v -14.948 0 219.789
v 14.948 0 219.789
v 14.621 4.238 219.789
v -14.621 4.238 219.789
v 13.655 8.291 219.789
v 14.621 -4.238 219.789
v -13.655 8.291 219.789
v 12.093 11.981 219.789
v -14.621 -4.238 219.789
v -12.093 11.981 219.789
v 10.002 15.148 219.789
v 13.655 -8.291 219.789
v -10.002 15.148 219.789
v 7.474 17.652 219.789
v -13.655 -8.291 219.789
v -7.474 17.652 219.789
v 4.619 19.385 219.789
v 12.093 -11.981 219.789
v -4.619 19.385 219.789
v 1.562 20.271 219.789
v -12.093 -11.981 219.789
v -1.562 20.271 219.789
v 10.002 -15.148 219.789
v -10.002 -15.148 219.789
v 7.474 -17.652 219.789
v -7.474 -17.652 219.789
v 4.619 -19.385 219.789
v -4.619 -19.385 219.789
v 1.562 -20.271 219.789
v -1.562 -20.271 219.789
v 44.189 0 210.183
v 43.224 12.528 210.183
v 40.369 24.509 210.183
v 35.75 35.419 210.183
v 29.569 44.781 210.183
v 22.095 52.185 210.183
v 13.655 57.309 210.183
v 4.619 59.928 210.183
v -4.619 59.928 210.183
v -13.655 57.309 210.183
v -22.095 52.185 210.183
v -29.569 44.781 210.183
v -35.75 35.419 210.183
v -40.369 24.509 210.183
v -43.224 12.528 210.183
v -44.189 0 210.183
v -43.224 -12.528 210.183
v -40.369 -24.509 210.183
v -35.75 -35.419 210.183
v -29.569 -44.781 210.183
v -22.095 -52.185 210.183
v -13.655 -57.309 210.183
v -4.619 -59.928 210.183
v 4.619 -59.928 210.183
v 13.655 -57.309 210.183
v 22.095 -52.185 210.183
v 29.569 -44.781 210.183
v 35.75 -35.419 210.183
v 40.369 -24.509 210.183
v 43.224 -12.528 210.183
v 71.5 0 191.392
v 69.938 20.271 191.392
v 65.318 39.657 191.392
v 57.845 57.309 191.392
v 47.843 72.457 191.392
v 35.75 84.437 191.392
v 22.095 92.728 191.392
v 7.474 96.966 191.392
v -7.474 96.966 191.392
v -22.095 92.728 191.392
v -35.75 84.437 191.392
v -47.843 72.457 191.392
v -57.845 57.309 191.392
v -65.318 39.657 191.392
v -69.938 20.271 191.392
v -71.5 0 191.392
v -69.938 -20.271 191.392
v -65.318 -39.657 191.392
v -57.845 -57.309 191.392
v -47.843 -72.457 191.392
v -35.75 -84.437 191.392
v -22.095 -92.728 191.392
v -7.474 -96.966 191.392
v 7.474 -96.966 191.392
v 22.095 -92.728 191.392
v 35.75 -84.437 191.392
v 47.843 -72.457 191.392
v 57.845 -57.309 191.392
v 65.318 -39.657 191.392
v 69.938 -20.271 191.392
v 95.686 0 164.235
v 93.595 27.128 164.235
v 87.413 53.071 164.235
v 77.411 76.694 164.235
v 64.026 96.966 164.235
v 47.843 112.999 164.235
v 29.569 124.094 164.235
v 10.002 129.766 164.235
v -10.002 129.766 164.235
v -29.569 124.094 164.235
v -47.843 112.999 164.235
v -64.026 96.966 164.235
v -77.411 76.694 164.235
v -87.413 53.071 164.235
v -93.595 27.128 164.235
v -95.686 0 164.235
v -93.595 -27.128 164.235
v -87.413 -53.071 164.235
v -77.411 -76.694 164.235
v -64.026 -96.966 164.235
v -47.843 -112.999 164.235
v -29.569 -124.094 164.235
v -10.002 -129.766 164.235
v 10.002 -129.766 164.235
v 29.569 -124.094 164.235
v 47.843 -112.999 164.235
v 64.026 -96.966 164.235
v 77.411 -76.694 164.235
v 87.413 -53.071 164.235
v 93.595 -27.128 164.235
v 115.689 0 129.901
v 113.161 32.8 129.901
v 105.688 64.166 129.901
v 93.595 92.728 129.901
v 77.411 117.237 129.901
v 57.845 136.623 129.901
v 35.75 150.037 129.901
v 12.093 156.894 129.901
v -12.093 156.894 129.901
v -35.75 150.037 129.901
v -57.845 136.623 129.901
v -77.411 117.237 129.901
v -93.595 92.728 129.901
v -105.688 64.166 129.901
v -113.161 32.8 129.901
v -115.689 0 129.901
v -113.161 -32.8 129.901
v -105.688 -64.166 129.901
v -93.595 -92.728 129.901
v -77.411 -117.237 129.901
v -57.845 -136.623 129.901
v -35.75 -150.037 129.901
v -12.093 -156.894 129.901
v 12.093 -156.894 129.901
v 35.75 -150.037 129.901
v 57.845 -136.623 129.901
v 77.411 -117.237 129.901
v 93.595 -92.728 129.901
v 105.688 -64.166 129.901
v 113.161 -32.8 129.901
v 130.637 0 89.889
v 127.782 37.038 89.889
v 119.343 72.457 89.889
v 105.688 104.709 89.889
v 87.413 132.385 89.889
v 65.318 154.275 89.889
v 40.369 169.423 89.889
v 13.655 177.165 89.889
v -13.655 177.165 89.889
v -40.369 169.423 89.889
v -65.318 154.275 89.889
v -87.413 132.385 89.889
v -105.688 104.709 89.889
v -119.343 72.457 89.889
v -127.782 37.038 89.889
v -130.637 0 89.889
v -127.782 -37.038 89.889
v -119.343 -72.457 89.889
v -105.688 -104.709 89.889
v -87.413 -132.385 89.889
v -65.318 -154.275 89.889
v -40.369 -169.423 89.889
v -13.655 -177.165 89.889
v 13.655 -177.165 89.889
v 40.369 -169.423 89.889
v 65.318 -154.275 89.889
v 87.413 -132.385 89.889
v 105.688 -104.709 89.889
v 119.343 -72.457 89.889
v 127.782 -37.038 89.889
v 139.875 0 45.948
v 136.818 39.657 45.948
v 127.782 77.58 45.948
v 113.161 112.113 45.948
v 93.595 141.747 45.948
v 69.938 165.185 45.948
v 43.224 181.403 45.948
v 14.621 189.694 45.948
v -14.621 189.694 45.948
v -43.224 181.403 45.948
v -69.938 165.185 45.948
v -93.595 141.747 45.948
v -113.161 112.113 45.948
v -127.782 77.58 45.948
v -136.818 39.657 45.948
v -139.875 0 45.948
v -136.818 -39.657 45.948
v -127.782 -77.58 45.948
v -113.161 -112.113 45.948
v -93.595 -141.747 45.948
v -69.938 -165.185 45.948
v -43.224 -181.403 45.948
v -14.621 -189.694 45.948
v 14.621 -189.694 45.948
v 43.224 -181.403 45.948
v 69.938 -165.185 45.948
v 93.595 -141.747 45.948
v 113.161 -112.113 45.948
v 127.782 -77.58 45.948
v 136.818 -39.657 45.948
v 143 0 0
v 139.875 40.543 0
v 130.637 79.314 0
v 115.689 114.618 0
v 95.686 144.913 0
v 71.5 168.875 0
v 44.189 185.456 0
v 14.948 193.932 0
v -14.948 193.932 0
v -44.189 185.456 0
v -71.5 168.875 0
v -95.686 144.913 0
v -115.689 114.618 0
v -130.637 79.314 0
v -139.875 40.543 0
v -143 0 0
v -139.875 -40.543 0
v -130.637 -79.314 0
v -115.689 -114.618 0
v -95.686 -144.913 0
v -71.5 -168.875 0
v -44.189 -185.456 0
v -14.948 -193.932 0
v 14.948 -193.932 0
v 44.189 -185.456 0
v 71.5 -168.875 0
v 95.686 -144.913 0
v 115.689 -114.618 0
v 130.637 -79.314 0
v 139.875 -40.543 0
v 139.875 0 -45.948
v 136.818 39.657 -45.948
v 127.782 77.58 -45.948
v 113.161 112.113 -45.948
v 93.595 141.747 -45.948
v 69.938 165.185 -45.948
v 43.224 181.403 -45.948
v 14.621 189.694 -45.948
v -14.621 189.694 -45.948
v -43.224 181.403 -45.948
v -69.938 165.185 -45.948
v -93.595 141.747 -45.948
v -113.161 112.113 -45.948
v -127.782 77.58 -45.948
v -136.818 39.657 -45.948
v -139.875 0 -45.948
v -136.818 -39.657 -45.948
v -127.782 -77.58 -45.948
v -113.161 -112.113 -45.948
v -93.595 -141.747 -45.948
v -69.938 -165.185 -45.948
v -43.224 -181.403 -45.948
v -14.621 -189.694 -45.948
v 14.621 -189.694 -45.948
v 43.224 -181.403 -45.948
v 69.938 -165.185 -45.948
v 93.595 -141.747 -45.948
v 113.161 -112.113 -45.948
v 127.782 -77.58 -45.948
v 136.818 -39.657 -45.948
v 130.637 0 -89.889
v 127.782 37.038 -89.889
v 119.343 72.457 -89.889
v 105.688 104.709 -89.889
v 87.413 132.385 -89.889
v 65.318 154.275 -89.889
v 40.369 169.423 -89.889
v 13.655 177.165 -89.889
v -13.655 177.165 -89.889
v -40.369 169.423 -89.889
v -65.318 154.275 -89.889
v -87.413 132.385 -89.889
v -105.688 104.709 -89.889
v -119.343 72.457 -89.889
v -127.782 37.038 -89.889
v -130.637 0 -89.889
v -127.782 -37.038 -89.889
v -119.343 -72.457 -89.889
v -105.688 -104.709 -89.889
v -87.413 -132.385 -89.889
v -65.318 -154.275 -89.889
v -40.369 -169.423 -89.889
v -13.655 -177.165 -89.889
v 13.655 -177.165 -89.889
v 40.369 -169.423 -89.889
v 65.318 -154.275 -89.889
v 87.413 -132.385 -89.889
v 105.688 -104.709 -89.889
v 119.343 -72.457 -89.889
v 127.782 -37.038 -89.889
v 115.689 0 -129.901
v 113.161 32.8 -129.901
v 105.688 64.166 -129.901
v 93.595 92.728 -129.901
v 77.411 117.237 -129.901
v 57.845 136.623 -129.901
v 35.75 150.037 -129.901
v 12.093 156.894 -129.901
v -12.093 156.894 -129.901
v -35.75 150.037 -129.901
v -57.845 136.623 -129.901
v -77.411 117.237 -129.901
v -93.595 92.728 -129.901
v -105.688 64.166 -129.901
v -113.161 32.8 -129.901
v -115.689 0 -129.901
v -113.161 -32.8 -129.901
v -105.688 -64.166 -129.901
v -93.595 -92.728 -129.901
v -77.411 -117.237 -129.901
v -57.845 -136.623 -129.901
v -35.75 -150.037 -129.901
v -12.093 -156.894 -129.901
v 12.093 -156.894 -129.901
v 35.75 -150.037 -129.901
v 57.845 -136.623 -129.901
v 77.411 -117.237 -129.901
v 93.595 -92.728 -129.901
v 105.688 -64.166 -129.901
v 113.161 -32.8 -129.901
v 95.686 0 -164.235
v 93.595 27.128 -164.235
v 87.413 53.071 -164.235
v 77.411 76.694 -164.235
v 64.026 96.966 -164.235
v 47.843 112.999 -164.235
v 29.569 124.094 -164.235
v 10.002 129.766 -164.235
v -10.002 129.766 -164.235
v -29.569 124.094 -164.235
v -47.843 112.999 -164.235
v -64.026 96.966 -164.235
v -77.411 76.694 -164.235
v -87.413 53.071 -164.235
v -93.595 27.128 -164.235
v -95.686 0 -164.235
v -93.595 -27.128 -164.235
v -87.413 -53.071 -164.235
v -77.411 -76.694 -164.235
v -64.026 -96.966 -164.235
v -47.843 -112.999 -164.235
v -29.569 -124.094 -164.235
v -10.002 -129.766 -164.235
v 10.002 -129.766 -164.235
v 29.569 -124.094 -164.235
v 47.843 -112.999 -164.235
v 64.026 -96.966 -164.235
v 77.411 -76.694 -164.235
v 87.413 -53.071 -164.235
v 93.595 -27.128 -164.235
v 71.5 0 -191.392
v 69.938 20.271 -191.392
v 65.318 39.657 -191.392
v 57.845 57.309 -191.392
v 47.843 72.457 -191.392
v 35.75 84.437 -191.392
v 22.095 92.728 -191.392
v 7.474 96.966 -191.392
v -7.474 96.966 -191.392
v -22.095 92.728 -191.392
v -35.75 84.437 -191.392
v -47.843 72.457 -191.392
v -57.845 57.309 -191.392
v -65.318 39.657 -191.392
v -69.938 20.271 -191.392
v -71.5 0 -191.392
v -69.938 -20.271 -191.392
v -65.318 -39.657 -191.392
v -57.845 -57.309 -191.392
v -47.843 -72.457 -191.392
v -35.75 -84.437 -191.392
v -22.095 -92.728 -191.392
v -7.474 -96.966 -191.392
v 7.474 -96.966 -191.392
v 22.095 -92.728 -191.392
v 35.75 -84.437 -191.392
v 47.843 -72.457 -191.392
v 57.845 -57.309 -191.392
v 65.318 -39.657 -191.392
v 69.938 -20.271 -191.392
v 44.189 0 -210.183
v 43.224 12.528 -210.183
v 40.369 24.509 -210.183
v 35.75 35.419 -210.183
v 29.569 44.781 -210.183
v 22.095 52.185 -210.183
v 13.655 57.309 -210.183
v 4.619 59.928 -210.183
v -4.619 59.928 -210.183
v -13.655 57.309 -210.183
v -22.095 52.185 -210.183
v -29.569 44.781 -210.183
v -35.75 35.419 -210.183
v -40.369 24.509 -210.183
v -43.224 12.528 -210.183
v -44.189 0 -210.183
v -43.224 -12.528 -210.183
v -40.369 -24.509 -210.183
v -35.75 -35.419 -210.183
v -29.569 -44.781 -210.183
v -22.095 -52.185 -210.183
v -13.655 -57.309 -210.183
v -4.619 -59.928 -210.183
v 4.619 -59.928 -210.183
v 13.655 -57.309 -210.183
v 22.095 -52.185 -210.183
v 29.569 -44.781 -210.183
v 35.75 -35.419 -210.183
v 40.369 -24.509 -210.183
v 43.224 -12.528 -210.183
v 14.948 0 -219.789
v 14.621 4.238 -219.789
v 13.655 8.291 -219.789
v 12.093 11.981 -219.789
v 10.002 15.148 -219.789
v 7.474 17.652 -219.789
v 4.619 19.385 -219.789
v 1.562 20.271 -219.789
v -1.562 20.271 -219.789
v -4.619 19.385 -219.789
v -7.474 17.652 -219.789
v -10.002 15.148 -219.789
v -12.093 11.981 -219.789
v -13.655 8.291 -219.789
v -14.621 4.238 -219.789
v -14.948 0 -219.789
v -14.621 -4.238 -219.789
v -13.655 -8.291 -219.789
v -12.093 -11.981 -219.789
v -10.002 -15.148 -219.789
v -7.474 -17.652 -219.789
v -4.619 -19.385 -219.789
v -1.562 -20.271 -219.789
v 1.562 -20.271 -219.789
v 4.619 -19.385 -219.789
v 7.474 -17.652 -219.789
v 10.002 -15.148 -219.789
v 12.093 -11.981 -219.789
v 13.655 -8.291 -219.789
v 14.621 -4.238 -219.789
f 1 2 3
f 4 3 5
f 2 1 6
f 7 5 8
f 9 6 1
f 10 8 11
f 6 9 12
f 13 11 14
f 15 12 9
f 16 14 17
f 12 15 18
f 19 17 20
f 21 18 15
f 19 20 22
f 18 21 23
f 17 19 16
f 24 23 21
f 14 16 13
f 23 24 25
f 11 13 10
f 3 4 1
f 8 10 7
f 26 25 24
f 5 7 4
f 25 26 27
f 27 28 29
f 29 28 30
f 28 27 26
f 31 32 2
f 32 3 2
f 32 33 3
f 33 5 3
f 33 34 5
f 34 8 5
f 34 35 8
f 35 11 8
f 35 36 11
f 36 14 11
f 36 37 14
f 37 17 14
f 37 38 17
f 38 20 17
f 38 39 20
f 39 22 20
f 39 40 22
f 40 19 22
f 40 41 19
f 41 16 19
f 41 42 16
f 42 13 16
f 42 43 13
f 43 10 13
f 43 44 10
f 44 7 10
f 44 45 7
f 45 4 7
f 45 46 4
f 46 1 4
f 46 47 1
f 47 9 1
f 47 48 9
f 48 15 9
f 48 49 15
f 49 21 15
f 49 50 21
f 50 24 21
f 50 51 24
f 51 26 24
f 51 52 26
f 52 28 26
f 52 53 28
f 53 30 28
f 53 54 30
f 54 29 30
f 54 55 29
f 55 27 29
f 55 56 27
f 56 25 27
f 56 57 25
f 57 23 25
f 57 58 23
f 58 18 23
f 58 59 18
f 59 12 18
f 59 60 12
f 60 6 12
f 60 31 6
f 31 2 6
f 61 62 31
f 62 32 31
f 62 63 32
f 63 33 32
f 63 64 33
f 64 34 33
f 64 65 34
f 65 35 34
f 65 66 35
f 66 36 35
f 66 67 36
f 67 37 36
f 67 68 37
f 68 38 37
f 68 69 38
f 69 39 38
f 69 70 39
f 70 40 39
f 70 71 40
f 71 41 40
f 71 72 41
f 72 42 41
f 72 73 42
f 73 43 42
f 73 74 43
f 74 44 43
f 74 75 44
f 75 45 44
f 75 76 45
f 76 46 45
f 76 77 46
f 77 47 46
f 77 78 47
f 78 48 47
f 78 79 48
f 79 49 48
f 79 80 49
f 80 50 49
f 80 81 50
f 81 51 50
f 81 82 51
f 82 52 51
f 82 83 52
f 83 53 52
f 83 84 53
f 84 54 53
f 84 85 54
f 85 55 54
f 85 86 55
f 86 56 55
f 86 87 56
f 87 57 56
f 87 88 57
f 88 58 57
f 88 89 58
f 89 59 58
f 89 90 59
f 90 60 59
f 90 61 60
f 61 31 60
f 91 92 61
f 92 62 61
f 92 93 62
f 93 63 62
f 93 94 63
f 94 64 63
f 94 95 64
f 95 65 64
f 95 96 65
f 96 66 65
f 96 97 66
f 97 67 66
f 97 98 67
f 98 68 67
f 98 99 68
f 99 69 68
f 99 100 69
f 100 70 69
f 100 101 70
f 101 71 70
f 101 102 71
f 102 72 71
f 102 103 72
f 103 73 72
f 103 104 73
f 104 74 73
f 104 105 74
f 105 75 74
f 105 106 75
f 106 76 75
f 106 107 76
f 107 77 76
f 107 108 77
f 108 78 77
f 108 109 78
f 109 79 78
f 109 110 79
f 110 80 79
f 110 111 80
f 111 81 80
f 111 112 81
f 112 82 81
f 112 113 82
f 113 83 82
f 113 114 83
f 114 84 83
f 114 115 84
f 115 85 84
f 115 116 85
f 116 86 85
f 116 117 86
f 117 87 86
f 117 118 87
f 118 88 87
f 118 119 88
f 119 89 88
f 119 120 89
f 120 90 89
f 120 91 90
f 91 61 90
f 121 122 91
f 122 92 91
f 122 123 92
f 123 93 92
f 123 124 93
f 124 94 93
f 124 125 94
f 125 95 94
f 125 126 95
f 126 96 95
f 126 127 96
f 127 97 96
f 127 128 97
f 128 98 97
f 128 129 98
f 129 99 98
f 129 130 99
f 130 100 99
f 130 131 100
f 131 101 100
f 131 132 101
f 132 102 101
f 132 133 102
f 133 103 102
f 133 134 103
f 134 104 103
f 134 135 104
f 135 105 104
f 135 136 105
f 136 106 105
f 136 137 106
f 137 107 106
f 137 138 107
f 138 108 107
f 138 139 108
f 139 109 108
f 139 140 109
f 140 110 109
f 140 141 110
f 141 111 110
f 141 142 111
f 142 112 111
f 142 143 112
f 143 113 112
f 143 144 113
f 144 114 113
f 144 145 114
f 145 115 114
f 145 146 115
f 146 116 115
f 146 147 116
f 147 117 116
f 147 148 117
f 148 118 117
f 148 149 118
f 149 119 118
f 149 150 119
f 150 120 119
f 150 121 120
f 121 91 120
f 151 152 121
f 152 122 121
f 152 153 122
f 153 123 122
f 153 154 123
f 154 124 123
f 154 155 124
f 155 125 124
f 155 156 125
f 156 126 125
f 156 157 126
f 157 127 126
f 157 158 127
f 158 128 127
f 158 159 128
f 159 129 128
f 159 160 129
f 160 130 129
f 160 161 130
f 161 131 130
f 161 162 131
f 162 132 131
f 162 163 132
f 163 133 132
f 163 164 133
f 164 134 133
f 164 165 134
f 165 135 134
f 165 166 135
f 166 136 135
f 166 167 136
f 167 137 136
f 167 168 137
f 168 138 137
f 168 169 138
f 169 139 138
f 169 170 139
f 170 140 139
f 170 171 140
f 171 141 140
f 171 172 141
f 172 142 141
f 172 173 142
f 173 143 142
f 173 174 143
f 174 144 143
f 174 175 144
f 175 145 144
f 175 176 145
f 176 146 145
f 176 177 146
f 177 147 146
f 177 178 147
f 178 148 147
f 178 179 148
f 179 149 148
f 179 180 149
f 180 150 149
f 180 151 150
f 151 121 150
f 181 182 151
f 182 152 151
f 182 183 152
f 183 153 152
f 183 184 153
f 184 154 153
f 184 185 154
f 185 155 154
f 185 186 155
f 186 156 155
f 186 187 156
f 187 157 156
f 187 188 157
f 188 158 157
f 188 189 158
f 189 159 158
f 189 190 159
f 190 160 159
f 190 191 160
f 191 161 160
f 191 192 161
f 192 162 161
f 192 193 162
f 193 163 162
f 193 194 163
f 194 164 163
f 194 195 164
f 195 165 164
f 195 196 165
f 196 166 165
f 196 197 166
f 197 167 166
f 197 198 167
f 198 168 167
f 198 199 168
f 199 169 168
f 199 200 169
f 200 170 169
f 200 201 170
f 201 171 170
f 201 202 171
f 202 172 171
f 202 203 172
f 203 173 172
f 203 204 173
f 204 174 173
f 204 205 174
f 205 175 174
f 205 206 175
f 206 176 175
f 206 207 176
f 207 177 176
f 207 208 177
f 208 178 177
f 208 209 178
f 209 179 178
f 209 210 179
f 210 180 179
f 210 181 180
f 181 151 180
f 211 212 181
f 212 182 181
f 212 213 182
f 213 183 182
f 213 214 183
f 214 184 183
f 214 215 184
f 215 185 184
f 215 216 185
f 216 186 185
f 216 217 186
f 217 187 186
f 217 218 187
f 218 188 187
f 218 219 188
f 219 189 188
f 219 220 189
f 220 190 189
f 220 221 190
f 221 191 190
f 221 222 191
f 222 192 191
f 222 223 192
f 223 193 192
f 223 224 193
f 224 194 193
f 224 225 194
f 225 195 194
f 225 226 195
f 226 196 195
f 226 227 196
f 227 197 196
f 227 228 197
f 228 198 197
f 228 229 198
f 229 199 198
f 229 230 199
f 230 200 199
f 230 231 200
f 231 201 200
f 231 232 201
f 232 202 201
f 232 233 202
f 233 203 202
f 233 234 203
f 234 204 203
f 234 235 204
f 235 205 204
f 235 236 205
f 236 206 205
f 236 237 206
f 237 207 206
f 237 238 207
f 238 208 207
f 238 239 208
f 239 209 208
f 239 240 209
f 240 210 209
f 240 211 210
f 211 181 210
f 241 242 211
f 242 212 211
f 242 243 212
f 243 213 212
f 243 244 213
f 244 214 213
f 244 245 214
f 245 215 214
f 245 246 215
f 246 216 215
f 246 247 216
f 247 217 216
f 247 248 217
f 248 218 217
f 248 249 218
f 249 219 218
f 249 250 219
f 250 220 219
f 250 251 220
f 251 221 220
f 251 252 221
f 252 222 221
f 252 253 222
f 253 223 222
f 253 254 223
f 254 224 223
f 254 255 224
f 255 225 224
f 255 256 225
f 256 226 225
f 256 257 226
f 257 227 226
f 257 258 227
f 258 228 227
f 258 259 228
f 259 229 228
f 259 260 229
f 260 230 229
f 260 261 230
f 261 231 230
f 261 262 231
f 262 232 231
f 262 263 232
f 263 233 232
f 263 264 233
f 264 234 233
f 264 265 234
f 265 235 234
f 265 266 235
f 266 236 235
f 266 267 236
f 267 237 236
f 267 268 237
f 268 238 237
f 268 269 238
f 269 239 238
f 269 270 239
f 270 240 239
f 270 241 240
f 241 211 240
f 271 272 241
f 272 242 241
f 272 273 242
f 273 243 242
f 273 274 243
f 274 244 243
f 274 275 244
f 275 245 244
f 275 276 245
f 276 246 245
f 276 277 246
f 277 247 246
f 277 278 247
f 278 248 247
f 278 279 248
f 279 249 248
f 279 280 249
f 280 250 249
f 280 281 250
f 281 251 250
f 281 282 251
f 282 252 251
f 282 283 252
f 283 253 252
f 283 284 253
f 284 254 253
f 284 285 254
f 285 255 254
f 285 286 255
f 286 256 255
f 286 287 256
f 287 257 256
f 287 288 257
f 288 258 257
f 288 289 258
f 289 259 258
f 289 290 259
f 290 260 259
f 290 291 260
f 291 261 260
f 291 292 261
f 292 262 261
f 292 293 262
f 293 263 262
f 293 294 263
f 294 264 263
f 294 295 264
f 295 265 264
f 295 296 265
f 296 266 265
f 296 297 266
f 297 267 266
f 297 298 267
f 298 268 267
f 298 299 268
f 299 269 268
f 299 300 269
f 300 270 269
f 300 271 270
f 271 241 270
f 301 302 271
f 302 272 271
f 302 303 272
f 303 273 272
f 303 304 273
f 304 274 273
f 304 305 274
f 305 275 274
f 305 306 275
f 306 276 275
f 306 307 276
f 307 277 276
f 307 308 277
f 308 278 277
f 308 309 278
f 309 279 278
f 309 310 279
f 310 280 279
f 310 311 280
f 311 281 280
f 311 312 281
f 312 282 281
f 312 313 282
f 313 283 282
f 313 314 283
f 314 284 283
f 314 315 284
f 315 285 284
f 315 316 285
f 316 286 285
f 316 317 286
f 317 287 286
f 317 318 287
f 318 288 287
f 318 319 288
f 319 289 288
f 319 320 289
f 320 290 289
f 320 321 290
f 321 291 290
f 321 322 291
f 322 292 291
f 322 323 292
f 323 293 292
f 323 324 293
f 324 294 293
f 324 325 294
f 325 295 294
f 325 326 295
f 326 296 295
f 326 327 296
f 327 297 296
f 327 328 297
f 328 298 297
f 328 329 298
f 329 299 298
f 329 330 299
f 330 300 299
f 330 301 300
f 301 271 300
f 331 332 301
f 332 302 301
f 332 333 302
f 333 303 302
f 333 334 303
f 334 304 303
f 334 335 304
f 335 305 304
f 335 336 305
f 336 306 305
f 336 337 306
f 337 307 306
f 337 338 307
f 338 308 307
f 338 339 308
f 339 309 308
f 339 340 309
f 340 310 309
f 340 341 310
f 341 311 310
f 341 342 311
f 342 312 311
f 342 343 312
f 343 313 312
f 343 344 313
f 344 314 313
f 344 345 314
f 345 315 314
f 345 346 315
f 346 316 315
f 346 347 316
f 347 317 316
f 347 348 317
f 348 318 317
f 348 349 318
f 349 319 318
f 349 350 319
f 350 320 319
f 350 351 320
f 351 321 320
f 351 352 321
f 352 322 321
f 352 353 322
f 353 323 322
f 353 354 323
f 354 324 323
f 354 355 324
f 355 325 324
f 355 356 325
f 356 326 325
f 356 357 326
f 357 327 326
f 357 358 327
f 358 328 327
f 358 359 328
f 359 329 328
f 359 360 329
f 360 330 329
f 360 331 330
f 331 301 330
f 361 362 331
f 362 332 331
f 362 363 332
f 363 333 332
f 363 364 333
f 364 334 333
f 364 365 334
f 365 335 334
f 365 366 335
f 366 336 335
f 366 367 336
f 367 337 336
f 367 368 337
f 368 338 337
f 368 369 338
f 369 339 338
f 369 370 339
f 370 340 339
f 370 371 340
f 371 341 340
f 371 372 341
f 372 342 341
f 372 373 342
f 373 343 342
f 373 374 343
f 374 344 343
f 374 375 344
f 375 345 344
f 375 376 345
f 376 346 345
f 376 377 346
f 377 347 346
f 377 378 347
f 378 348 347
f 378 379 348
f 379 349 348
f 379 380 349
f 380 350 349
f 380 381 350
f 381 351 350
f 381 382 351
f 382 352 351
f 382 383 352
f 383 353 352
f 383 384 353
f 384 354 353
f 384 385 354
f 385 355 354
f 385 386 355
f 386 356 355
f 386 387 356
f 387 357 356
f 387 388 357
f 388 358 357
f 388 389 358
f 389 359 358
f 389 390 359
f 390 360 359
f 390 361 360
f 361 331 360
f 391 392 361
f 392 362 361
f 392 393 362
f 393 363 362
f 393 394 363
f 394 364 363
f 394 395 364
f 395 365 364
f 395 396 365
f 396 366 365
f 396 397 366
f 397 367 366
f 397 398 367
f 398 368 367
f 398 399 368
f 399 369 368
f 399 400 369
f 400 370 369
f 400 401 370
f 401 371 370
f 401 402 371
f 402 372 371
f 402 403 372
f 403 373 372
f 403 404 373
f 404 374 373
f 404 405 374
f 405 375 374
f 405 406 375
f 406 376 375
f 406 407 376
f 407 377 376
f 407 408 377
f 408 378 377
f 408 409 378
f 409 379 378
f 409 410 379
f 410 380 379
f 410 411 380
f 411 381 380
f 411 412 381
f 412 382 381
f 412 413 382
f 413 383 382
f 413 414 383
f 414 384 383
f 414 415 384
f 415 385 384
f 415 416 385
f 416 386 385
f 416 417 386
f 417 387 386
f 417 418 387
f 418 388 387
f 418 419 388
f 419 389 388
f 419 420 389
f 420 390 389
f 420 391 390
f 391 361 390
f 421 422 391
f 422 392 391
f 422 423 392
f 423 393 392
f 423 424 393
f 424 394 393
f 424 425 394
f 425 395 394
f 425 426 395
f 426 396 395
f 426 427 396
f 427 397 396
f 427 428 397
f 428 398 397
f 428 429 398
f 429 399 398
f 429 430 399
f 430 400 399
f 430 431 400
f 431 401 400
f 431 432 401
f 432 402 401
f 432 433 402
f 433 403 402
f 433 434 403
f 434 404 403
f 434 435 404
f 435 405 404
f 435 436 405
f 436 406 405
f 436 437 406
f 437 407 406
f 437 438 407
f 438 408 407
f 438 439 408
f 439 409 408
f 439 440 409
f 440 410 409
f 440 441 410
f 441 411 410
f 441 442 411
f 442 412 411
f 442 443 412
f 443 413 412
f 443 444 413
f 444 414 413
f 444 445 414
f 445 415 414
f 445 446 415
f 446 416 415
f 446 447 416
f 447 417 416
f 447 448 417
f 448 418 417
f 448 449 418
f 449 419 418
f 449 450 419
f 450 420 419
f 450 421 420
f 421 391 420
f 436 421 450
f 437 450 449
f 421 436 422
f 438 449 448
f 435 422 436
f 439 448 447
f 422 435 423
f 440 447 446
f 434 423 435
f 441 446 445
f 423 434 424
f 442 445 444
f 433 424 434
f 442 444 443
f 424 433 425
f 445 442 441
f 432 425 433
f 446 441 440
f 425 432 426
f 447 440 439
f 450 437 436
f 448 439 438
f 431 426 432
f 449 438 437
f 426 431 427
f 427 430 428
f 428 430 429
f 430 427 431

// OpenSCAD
// Generated by SolidPython 1.0.1 on 2020-07-29 00:46:50


scale(v = [11, 15, 17]) {
	sphere(r = 13);
}
/***********************************************
*********      SolidPython code:      **********
************************************************
 
# import packages: SolidPython
from solid import *
from solid.utils import *
from itertools import chain, combinations, permutations


class Resize:

    def __init__(self, scad_file):
        self.scad_file = scad_file
        #self.scad_file = import_scad(scad_file)
        # cone/cylinder param:
        self.r1 = 0
        self.r2 = 0
        self.h = 0
        # rectangular prism param:
        self.w = 0
        self.l = 0
        # ellipse param:
        self.r = 0

    # import OpenScad code (file name corresponds to shape)


    # classify shape + parameters
    def assign(self, param1, param2, param3):
        if self.scad_file == 'cone.scad':
            self.r1 = param1
            self.r2 = param2
            self.h = param3
        elif self.scad_file == 'cylinder.scad':
            self.r1 = param1
            self.r2 = param2
            self.h = param3
        elif self.scad_file == 'rectangularPrism.scad':
            self.h = param1
            self.l = param2
            self.w = param3
        else:
            self.r = param1
            self.h = param2

    # resize parameters
    def iterate(self):
        x = range(3, 20, 2)
        i = 1
        if self.scad_file == 'cone.scad':
            tempList = list(permutations(x, 2))
            for temp in tempList:
                param1 = temp[0]
                param2 = temp[1]
                filepath = 'produced_scad_files/' + 'cone' + str(param1) + '_' + str(param2) + '_' + '.scad'
                scad_render_to_file(cylinder(h=param1, r1=param2, r2=0), filepath)

        elif self.scad_file == 'cylinder.scad':
            tempList = list(permutations(x, 3))
            for temp in tempList:
                param1 = temp[0]
                param2 = temp[1]
                filepath = 'produced_scad_files/' + 'cylinder' + str(param1) + '_' + str(param2) + '_' + '.scad'
                scad_render_to_file(cylinder(h=param1, r1=param2, r2=param2), filepath)

        elif self.scad_file == 'rectangularPrism.scad':
            tempList = list(permutations(x, 3))
            for temp in tempList:
                param1 = temp[0]
                param2 = temp[1]
                param3 = temp[2]
                filepath = 'produced_scad_files/' + 'rectangularPrism' + str(param1) + '_' + str(param2) + '_' + str(
                    param3) + '.scad'
                scad_render_to_file(cube(size=(param1, param2, param3)), filepath)

        elif self.scad_file == 'ellipse.scad':
            tempList = list(permutations(x, 4))
            for temp in tempList:
                param1 = temp[0]
                param2 = temp[1]
                param3 = temp[2]
                param4 = temp[3]
                filepath = 'produced_scad_files/' + 'ellipse' + str(param1) + '_' + str(param2) + '_' + str(param3) + '_' + str(param4) + '.scad'
                scad_render_to_file(scale([param1, param2, param3])(sphere(r=param4)), filepath)

    def render_to_scadfile(self):
        scad_render_to_file(scad, 'example.scad') 
 
************************************************/
